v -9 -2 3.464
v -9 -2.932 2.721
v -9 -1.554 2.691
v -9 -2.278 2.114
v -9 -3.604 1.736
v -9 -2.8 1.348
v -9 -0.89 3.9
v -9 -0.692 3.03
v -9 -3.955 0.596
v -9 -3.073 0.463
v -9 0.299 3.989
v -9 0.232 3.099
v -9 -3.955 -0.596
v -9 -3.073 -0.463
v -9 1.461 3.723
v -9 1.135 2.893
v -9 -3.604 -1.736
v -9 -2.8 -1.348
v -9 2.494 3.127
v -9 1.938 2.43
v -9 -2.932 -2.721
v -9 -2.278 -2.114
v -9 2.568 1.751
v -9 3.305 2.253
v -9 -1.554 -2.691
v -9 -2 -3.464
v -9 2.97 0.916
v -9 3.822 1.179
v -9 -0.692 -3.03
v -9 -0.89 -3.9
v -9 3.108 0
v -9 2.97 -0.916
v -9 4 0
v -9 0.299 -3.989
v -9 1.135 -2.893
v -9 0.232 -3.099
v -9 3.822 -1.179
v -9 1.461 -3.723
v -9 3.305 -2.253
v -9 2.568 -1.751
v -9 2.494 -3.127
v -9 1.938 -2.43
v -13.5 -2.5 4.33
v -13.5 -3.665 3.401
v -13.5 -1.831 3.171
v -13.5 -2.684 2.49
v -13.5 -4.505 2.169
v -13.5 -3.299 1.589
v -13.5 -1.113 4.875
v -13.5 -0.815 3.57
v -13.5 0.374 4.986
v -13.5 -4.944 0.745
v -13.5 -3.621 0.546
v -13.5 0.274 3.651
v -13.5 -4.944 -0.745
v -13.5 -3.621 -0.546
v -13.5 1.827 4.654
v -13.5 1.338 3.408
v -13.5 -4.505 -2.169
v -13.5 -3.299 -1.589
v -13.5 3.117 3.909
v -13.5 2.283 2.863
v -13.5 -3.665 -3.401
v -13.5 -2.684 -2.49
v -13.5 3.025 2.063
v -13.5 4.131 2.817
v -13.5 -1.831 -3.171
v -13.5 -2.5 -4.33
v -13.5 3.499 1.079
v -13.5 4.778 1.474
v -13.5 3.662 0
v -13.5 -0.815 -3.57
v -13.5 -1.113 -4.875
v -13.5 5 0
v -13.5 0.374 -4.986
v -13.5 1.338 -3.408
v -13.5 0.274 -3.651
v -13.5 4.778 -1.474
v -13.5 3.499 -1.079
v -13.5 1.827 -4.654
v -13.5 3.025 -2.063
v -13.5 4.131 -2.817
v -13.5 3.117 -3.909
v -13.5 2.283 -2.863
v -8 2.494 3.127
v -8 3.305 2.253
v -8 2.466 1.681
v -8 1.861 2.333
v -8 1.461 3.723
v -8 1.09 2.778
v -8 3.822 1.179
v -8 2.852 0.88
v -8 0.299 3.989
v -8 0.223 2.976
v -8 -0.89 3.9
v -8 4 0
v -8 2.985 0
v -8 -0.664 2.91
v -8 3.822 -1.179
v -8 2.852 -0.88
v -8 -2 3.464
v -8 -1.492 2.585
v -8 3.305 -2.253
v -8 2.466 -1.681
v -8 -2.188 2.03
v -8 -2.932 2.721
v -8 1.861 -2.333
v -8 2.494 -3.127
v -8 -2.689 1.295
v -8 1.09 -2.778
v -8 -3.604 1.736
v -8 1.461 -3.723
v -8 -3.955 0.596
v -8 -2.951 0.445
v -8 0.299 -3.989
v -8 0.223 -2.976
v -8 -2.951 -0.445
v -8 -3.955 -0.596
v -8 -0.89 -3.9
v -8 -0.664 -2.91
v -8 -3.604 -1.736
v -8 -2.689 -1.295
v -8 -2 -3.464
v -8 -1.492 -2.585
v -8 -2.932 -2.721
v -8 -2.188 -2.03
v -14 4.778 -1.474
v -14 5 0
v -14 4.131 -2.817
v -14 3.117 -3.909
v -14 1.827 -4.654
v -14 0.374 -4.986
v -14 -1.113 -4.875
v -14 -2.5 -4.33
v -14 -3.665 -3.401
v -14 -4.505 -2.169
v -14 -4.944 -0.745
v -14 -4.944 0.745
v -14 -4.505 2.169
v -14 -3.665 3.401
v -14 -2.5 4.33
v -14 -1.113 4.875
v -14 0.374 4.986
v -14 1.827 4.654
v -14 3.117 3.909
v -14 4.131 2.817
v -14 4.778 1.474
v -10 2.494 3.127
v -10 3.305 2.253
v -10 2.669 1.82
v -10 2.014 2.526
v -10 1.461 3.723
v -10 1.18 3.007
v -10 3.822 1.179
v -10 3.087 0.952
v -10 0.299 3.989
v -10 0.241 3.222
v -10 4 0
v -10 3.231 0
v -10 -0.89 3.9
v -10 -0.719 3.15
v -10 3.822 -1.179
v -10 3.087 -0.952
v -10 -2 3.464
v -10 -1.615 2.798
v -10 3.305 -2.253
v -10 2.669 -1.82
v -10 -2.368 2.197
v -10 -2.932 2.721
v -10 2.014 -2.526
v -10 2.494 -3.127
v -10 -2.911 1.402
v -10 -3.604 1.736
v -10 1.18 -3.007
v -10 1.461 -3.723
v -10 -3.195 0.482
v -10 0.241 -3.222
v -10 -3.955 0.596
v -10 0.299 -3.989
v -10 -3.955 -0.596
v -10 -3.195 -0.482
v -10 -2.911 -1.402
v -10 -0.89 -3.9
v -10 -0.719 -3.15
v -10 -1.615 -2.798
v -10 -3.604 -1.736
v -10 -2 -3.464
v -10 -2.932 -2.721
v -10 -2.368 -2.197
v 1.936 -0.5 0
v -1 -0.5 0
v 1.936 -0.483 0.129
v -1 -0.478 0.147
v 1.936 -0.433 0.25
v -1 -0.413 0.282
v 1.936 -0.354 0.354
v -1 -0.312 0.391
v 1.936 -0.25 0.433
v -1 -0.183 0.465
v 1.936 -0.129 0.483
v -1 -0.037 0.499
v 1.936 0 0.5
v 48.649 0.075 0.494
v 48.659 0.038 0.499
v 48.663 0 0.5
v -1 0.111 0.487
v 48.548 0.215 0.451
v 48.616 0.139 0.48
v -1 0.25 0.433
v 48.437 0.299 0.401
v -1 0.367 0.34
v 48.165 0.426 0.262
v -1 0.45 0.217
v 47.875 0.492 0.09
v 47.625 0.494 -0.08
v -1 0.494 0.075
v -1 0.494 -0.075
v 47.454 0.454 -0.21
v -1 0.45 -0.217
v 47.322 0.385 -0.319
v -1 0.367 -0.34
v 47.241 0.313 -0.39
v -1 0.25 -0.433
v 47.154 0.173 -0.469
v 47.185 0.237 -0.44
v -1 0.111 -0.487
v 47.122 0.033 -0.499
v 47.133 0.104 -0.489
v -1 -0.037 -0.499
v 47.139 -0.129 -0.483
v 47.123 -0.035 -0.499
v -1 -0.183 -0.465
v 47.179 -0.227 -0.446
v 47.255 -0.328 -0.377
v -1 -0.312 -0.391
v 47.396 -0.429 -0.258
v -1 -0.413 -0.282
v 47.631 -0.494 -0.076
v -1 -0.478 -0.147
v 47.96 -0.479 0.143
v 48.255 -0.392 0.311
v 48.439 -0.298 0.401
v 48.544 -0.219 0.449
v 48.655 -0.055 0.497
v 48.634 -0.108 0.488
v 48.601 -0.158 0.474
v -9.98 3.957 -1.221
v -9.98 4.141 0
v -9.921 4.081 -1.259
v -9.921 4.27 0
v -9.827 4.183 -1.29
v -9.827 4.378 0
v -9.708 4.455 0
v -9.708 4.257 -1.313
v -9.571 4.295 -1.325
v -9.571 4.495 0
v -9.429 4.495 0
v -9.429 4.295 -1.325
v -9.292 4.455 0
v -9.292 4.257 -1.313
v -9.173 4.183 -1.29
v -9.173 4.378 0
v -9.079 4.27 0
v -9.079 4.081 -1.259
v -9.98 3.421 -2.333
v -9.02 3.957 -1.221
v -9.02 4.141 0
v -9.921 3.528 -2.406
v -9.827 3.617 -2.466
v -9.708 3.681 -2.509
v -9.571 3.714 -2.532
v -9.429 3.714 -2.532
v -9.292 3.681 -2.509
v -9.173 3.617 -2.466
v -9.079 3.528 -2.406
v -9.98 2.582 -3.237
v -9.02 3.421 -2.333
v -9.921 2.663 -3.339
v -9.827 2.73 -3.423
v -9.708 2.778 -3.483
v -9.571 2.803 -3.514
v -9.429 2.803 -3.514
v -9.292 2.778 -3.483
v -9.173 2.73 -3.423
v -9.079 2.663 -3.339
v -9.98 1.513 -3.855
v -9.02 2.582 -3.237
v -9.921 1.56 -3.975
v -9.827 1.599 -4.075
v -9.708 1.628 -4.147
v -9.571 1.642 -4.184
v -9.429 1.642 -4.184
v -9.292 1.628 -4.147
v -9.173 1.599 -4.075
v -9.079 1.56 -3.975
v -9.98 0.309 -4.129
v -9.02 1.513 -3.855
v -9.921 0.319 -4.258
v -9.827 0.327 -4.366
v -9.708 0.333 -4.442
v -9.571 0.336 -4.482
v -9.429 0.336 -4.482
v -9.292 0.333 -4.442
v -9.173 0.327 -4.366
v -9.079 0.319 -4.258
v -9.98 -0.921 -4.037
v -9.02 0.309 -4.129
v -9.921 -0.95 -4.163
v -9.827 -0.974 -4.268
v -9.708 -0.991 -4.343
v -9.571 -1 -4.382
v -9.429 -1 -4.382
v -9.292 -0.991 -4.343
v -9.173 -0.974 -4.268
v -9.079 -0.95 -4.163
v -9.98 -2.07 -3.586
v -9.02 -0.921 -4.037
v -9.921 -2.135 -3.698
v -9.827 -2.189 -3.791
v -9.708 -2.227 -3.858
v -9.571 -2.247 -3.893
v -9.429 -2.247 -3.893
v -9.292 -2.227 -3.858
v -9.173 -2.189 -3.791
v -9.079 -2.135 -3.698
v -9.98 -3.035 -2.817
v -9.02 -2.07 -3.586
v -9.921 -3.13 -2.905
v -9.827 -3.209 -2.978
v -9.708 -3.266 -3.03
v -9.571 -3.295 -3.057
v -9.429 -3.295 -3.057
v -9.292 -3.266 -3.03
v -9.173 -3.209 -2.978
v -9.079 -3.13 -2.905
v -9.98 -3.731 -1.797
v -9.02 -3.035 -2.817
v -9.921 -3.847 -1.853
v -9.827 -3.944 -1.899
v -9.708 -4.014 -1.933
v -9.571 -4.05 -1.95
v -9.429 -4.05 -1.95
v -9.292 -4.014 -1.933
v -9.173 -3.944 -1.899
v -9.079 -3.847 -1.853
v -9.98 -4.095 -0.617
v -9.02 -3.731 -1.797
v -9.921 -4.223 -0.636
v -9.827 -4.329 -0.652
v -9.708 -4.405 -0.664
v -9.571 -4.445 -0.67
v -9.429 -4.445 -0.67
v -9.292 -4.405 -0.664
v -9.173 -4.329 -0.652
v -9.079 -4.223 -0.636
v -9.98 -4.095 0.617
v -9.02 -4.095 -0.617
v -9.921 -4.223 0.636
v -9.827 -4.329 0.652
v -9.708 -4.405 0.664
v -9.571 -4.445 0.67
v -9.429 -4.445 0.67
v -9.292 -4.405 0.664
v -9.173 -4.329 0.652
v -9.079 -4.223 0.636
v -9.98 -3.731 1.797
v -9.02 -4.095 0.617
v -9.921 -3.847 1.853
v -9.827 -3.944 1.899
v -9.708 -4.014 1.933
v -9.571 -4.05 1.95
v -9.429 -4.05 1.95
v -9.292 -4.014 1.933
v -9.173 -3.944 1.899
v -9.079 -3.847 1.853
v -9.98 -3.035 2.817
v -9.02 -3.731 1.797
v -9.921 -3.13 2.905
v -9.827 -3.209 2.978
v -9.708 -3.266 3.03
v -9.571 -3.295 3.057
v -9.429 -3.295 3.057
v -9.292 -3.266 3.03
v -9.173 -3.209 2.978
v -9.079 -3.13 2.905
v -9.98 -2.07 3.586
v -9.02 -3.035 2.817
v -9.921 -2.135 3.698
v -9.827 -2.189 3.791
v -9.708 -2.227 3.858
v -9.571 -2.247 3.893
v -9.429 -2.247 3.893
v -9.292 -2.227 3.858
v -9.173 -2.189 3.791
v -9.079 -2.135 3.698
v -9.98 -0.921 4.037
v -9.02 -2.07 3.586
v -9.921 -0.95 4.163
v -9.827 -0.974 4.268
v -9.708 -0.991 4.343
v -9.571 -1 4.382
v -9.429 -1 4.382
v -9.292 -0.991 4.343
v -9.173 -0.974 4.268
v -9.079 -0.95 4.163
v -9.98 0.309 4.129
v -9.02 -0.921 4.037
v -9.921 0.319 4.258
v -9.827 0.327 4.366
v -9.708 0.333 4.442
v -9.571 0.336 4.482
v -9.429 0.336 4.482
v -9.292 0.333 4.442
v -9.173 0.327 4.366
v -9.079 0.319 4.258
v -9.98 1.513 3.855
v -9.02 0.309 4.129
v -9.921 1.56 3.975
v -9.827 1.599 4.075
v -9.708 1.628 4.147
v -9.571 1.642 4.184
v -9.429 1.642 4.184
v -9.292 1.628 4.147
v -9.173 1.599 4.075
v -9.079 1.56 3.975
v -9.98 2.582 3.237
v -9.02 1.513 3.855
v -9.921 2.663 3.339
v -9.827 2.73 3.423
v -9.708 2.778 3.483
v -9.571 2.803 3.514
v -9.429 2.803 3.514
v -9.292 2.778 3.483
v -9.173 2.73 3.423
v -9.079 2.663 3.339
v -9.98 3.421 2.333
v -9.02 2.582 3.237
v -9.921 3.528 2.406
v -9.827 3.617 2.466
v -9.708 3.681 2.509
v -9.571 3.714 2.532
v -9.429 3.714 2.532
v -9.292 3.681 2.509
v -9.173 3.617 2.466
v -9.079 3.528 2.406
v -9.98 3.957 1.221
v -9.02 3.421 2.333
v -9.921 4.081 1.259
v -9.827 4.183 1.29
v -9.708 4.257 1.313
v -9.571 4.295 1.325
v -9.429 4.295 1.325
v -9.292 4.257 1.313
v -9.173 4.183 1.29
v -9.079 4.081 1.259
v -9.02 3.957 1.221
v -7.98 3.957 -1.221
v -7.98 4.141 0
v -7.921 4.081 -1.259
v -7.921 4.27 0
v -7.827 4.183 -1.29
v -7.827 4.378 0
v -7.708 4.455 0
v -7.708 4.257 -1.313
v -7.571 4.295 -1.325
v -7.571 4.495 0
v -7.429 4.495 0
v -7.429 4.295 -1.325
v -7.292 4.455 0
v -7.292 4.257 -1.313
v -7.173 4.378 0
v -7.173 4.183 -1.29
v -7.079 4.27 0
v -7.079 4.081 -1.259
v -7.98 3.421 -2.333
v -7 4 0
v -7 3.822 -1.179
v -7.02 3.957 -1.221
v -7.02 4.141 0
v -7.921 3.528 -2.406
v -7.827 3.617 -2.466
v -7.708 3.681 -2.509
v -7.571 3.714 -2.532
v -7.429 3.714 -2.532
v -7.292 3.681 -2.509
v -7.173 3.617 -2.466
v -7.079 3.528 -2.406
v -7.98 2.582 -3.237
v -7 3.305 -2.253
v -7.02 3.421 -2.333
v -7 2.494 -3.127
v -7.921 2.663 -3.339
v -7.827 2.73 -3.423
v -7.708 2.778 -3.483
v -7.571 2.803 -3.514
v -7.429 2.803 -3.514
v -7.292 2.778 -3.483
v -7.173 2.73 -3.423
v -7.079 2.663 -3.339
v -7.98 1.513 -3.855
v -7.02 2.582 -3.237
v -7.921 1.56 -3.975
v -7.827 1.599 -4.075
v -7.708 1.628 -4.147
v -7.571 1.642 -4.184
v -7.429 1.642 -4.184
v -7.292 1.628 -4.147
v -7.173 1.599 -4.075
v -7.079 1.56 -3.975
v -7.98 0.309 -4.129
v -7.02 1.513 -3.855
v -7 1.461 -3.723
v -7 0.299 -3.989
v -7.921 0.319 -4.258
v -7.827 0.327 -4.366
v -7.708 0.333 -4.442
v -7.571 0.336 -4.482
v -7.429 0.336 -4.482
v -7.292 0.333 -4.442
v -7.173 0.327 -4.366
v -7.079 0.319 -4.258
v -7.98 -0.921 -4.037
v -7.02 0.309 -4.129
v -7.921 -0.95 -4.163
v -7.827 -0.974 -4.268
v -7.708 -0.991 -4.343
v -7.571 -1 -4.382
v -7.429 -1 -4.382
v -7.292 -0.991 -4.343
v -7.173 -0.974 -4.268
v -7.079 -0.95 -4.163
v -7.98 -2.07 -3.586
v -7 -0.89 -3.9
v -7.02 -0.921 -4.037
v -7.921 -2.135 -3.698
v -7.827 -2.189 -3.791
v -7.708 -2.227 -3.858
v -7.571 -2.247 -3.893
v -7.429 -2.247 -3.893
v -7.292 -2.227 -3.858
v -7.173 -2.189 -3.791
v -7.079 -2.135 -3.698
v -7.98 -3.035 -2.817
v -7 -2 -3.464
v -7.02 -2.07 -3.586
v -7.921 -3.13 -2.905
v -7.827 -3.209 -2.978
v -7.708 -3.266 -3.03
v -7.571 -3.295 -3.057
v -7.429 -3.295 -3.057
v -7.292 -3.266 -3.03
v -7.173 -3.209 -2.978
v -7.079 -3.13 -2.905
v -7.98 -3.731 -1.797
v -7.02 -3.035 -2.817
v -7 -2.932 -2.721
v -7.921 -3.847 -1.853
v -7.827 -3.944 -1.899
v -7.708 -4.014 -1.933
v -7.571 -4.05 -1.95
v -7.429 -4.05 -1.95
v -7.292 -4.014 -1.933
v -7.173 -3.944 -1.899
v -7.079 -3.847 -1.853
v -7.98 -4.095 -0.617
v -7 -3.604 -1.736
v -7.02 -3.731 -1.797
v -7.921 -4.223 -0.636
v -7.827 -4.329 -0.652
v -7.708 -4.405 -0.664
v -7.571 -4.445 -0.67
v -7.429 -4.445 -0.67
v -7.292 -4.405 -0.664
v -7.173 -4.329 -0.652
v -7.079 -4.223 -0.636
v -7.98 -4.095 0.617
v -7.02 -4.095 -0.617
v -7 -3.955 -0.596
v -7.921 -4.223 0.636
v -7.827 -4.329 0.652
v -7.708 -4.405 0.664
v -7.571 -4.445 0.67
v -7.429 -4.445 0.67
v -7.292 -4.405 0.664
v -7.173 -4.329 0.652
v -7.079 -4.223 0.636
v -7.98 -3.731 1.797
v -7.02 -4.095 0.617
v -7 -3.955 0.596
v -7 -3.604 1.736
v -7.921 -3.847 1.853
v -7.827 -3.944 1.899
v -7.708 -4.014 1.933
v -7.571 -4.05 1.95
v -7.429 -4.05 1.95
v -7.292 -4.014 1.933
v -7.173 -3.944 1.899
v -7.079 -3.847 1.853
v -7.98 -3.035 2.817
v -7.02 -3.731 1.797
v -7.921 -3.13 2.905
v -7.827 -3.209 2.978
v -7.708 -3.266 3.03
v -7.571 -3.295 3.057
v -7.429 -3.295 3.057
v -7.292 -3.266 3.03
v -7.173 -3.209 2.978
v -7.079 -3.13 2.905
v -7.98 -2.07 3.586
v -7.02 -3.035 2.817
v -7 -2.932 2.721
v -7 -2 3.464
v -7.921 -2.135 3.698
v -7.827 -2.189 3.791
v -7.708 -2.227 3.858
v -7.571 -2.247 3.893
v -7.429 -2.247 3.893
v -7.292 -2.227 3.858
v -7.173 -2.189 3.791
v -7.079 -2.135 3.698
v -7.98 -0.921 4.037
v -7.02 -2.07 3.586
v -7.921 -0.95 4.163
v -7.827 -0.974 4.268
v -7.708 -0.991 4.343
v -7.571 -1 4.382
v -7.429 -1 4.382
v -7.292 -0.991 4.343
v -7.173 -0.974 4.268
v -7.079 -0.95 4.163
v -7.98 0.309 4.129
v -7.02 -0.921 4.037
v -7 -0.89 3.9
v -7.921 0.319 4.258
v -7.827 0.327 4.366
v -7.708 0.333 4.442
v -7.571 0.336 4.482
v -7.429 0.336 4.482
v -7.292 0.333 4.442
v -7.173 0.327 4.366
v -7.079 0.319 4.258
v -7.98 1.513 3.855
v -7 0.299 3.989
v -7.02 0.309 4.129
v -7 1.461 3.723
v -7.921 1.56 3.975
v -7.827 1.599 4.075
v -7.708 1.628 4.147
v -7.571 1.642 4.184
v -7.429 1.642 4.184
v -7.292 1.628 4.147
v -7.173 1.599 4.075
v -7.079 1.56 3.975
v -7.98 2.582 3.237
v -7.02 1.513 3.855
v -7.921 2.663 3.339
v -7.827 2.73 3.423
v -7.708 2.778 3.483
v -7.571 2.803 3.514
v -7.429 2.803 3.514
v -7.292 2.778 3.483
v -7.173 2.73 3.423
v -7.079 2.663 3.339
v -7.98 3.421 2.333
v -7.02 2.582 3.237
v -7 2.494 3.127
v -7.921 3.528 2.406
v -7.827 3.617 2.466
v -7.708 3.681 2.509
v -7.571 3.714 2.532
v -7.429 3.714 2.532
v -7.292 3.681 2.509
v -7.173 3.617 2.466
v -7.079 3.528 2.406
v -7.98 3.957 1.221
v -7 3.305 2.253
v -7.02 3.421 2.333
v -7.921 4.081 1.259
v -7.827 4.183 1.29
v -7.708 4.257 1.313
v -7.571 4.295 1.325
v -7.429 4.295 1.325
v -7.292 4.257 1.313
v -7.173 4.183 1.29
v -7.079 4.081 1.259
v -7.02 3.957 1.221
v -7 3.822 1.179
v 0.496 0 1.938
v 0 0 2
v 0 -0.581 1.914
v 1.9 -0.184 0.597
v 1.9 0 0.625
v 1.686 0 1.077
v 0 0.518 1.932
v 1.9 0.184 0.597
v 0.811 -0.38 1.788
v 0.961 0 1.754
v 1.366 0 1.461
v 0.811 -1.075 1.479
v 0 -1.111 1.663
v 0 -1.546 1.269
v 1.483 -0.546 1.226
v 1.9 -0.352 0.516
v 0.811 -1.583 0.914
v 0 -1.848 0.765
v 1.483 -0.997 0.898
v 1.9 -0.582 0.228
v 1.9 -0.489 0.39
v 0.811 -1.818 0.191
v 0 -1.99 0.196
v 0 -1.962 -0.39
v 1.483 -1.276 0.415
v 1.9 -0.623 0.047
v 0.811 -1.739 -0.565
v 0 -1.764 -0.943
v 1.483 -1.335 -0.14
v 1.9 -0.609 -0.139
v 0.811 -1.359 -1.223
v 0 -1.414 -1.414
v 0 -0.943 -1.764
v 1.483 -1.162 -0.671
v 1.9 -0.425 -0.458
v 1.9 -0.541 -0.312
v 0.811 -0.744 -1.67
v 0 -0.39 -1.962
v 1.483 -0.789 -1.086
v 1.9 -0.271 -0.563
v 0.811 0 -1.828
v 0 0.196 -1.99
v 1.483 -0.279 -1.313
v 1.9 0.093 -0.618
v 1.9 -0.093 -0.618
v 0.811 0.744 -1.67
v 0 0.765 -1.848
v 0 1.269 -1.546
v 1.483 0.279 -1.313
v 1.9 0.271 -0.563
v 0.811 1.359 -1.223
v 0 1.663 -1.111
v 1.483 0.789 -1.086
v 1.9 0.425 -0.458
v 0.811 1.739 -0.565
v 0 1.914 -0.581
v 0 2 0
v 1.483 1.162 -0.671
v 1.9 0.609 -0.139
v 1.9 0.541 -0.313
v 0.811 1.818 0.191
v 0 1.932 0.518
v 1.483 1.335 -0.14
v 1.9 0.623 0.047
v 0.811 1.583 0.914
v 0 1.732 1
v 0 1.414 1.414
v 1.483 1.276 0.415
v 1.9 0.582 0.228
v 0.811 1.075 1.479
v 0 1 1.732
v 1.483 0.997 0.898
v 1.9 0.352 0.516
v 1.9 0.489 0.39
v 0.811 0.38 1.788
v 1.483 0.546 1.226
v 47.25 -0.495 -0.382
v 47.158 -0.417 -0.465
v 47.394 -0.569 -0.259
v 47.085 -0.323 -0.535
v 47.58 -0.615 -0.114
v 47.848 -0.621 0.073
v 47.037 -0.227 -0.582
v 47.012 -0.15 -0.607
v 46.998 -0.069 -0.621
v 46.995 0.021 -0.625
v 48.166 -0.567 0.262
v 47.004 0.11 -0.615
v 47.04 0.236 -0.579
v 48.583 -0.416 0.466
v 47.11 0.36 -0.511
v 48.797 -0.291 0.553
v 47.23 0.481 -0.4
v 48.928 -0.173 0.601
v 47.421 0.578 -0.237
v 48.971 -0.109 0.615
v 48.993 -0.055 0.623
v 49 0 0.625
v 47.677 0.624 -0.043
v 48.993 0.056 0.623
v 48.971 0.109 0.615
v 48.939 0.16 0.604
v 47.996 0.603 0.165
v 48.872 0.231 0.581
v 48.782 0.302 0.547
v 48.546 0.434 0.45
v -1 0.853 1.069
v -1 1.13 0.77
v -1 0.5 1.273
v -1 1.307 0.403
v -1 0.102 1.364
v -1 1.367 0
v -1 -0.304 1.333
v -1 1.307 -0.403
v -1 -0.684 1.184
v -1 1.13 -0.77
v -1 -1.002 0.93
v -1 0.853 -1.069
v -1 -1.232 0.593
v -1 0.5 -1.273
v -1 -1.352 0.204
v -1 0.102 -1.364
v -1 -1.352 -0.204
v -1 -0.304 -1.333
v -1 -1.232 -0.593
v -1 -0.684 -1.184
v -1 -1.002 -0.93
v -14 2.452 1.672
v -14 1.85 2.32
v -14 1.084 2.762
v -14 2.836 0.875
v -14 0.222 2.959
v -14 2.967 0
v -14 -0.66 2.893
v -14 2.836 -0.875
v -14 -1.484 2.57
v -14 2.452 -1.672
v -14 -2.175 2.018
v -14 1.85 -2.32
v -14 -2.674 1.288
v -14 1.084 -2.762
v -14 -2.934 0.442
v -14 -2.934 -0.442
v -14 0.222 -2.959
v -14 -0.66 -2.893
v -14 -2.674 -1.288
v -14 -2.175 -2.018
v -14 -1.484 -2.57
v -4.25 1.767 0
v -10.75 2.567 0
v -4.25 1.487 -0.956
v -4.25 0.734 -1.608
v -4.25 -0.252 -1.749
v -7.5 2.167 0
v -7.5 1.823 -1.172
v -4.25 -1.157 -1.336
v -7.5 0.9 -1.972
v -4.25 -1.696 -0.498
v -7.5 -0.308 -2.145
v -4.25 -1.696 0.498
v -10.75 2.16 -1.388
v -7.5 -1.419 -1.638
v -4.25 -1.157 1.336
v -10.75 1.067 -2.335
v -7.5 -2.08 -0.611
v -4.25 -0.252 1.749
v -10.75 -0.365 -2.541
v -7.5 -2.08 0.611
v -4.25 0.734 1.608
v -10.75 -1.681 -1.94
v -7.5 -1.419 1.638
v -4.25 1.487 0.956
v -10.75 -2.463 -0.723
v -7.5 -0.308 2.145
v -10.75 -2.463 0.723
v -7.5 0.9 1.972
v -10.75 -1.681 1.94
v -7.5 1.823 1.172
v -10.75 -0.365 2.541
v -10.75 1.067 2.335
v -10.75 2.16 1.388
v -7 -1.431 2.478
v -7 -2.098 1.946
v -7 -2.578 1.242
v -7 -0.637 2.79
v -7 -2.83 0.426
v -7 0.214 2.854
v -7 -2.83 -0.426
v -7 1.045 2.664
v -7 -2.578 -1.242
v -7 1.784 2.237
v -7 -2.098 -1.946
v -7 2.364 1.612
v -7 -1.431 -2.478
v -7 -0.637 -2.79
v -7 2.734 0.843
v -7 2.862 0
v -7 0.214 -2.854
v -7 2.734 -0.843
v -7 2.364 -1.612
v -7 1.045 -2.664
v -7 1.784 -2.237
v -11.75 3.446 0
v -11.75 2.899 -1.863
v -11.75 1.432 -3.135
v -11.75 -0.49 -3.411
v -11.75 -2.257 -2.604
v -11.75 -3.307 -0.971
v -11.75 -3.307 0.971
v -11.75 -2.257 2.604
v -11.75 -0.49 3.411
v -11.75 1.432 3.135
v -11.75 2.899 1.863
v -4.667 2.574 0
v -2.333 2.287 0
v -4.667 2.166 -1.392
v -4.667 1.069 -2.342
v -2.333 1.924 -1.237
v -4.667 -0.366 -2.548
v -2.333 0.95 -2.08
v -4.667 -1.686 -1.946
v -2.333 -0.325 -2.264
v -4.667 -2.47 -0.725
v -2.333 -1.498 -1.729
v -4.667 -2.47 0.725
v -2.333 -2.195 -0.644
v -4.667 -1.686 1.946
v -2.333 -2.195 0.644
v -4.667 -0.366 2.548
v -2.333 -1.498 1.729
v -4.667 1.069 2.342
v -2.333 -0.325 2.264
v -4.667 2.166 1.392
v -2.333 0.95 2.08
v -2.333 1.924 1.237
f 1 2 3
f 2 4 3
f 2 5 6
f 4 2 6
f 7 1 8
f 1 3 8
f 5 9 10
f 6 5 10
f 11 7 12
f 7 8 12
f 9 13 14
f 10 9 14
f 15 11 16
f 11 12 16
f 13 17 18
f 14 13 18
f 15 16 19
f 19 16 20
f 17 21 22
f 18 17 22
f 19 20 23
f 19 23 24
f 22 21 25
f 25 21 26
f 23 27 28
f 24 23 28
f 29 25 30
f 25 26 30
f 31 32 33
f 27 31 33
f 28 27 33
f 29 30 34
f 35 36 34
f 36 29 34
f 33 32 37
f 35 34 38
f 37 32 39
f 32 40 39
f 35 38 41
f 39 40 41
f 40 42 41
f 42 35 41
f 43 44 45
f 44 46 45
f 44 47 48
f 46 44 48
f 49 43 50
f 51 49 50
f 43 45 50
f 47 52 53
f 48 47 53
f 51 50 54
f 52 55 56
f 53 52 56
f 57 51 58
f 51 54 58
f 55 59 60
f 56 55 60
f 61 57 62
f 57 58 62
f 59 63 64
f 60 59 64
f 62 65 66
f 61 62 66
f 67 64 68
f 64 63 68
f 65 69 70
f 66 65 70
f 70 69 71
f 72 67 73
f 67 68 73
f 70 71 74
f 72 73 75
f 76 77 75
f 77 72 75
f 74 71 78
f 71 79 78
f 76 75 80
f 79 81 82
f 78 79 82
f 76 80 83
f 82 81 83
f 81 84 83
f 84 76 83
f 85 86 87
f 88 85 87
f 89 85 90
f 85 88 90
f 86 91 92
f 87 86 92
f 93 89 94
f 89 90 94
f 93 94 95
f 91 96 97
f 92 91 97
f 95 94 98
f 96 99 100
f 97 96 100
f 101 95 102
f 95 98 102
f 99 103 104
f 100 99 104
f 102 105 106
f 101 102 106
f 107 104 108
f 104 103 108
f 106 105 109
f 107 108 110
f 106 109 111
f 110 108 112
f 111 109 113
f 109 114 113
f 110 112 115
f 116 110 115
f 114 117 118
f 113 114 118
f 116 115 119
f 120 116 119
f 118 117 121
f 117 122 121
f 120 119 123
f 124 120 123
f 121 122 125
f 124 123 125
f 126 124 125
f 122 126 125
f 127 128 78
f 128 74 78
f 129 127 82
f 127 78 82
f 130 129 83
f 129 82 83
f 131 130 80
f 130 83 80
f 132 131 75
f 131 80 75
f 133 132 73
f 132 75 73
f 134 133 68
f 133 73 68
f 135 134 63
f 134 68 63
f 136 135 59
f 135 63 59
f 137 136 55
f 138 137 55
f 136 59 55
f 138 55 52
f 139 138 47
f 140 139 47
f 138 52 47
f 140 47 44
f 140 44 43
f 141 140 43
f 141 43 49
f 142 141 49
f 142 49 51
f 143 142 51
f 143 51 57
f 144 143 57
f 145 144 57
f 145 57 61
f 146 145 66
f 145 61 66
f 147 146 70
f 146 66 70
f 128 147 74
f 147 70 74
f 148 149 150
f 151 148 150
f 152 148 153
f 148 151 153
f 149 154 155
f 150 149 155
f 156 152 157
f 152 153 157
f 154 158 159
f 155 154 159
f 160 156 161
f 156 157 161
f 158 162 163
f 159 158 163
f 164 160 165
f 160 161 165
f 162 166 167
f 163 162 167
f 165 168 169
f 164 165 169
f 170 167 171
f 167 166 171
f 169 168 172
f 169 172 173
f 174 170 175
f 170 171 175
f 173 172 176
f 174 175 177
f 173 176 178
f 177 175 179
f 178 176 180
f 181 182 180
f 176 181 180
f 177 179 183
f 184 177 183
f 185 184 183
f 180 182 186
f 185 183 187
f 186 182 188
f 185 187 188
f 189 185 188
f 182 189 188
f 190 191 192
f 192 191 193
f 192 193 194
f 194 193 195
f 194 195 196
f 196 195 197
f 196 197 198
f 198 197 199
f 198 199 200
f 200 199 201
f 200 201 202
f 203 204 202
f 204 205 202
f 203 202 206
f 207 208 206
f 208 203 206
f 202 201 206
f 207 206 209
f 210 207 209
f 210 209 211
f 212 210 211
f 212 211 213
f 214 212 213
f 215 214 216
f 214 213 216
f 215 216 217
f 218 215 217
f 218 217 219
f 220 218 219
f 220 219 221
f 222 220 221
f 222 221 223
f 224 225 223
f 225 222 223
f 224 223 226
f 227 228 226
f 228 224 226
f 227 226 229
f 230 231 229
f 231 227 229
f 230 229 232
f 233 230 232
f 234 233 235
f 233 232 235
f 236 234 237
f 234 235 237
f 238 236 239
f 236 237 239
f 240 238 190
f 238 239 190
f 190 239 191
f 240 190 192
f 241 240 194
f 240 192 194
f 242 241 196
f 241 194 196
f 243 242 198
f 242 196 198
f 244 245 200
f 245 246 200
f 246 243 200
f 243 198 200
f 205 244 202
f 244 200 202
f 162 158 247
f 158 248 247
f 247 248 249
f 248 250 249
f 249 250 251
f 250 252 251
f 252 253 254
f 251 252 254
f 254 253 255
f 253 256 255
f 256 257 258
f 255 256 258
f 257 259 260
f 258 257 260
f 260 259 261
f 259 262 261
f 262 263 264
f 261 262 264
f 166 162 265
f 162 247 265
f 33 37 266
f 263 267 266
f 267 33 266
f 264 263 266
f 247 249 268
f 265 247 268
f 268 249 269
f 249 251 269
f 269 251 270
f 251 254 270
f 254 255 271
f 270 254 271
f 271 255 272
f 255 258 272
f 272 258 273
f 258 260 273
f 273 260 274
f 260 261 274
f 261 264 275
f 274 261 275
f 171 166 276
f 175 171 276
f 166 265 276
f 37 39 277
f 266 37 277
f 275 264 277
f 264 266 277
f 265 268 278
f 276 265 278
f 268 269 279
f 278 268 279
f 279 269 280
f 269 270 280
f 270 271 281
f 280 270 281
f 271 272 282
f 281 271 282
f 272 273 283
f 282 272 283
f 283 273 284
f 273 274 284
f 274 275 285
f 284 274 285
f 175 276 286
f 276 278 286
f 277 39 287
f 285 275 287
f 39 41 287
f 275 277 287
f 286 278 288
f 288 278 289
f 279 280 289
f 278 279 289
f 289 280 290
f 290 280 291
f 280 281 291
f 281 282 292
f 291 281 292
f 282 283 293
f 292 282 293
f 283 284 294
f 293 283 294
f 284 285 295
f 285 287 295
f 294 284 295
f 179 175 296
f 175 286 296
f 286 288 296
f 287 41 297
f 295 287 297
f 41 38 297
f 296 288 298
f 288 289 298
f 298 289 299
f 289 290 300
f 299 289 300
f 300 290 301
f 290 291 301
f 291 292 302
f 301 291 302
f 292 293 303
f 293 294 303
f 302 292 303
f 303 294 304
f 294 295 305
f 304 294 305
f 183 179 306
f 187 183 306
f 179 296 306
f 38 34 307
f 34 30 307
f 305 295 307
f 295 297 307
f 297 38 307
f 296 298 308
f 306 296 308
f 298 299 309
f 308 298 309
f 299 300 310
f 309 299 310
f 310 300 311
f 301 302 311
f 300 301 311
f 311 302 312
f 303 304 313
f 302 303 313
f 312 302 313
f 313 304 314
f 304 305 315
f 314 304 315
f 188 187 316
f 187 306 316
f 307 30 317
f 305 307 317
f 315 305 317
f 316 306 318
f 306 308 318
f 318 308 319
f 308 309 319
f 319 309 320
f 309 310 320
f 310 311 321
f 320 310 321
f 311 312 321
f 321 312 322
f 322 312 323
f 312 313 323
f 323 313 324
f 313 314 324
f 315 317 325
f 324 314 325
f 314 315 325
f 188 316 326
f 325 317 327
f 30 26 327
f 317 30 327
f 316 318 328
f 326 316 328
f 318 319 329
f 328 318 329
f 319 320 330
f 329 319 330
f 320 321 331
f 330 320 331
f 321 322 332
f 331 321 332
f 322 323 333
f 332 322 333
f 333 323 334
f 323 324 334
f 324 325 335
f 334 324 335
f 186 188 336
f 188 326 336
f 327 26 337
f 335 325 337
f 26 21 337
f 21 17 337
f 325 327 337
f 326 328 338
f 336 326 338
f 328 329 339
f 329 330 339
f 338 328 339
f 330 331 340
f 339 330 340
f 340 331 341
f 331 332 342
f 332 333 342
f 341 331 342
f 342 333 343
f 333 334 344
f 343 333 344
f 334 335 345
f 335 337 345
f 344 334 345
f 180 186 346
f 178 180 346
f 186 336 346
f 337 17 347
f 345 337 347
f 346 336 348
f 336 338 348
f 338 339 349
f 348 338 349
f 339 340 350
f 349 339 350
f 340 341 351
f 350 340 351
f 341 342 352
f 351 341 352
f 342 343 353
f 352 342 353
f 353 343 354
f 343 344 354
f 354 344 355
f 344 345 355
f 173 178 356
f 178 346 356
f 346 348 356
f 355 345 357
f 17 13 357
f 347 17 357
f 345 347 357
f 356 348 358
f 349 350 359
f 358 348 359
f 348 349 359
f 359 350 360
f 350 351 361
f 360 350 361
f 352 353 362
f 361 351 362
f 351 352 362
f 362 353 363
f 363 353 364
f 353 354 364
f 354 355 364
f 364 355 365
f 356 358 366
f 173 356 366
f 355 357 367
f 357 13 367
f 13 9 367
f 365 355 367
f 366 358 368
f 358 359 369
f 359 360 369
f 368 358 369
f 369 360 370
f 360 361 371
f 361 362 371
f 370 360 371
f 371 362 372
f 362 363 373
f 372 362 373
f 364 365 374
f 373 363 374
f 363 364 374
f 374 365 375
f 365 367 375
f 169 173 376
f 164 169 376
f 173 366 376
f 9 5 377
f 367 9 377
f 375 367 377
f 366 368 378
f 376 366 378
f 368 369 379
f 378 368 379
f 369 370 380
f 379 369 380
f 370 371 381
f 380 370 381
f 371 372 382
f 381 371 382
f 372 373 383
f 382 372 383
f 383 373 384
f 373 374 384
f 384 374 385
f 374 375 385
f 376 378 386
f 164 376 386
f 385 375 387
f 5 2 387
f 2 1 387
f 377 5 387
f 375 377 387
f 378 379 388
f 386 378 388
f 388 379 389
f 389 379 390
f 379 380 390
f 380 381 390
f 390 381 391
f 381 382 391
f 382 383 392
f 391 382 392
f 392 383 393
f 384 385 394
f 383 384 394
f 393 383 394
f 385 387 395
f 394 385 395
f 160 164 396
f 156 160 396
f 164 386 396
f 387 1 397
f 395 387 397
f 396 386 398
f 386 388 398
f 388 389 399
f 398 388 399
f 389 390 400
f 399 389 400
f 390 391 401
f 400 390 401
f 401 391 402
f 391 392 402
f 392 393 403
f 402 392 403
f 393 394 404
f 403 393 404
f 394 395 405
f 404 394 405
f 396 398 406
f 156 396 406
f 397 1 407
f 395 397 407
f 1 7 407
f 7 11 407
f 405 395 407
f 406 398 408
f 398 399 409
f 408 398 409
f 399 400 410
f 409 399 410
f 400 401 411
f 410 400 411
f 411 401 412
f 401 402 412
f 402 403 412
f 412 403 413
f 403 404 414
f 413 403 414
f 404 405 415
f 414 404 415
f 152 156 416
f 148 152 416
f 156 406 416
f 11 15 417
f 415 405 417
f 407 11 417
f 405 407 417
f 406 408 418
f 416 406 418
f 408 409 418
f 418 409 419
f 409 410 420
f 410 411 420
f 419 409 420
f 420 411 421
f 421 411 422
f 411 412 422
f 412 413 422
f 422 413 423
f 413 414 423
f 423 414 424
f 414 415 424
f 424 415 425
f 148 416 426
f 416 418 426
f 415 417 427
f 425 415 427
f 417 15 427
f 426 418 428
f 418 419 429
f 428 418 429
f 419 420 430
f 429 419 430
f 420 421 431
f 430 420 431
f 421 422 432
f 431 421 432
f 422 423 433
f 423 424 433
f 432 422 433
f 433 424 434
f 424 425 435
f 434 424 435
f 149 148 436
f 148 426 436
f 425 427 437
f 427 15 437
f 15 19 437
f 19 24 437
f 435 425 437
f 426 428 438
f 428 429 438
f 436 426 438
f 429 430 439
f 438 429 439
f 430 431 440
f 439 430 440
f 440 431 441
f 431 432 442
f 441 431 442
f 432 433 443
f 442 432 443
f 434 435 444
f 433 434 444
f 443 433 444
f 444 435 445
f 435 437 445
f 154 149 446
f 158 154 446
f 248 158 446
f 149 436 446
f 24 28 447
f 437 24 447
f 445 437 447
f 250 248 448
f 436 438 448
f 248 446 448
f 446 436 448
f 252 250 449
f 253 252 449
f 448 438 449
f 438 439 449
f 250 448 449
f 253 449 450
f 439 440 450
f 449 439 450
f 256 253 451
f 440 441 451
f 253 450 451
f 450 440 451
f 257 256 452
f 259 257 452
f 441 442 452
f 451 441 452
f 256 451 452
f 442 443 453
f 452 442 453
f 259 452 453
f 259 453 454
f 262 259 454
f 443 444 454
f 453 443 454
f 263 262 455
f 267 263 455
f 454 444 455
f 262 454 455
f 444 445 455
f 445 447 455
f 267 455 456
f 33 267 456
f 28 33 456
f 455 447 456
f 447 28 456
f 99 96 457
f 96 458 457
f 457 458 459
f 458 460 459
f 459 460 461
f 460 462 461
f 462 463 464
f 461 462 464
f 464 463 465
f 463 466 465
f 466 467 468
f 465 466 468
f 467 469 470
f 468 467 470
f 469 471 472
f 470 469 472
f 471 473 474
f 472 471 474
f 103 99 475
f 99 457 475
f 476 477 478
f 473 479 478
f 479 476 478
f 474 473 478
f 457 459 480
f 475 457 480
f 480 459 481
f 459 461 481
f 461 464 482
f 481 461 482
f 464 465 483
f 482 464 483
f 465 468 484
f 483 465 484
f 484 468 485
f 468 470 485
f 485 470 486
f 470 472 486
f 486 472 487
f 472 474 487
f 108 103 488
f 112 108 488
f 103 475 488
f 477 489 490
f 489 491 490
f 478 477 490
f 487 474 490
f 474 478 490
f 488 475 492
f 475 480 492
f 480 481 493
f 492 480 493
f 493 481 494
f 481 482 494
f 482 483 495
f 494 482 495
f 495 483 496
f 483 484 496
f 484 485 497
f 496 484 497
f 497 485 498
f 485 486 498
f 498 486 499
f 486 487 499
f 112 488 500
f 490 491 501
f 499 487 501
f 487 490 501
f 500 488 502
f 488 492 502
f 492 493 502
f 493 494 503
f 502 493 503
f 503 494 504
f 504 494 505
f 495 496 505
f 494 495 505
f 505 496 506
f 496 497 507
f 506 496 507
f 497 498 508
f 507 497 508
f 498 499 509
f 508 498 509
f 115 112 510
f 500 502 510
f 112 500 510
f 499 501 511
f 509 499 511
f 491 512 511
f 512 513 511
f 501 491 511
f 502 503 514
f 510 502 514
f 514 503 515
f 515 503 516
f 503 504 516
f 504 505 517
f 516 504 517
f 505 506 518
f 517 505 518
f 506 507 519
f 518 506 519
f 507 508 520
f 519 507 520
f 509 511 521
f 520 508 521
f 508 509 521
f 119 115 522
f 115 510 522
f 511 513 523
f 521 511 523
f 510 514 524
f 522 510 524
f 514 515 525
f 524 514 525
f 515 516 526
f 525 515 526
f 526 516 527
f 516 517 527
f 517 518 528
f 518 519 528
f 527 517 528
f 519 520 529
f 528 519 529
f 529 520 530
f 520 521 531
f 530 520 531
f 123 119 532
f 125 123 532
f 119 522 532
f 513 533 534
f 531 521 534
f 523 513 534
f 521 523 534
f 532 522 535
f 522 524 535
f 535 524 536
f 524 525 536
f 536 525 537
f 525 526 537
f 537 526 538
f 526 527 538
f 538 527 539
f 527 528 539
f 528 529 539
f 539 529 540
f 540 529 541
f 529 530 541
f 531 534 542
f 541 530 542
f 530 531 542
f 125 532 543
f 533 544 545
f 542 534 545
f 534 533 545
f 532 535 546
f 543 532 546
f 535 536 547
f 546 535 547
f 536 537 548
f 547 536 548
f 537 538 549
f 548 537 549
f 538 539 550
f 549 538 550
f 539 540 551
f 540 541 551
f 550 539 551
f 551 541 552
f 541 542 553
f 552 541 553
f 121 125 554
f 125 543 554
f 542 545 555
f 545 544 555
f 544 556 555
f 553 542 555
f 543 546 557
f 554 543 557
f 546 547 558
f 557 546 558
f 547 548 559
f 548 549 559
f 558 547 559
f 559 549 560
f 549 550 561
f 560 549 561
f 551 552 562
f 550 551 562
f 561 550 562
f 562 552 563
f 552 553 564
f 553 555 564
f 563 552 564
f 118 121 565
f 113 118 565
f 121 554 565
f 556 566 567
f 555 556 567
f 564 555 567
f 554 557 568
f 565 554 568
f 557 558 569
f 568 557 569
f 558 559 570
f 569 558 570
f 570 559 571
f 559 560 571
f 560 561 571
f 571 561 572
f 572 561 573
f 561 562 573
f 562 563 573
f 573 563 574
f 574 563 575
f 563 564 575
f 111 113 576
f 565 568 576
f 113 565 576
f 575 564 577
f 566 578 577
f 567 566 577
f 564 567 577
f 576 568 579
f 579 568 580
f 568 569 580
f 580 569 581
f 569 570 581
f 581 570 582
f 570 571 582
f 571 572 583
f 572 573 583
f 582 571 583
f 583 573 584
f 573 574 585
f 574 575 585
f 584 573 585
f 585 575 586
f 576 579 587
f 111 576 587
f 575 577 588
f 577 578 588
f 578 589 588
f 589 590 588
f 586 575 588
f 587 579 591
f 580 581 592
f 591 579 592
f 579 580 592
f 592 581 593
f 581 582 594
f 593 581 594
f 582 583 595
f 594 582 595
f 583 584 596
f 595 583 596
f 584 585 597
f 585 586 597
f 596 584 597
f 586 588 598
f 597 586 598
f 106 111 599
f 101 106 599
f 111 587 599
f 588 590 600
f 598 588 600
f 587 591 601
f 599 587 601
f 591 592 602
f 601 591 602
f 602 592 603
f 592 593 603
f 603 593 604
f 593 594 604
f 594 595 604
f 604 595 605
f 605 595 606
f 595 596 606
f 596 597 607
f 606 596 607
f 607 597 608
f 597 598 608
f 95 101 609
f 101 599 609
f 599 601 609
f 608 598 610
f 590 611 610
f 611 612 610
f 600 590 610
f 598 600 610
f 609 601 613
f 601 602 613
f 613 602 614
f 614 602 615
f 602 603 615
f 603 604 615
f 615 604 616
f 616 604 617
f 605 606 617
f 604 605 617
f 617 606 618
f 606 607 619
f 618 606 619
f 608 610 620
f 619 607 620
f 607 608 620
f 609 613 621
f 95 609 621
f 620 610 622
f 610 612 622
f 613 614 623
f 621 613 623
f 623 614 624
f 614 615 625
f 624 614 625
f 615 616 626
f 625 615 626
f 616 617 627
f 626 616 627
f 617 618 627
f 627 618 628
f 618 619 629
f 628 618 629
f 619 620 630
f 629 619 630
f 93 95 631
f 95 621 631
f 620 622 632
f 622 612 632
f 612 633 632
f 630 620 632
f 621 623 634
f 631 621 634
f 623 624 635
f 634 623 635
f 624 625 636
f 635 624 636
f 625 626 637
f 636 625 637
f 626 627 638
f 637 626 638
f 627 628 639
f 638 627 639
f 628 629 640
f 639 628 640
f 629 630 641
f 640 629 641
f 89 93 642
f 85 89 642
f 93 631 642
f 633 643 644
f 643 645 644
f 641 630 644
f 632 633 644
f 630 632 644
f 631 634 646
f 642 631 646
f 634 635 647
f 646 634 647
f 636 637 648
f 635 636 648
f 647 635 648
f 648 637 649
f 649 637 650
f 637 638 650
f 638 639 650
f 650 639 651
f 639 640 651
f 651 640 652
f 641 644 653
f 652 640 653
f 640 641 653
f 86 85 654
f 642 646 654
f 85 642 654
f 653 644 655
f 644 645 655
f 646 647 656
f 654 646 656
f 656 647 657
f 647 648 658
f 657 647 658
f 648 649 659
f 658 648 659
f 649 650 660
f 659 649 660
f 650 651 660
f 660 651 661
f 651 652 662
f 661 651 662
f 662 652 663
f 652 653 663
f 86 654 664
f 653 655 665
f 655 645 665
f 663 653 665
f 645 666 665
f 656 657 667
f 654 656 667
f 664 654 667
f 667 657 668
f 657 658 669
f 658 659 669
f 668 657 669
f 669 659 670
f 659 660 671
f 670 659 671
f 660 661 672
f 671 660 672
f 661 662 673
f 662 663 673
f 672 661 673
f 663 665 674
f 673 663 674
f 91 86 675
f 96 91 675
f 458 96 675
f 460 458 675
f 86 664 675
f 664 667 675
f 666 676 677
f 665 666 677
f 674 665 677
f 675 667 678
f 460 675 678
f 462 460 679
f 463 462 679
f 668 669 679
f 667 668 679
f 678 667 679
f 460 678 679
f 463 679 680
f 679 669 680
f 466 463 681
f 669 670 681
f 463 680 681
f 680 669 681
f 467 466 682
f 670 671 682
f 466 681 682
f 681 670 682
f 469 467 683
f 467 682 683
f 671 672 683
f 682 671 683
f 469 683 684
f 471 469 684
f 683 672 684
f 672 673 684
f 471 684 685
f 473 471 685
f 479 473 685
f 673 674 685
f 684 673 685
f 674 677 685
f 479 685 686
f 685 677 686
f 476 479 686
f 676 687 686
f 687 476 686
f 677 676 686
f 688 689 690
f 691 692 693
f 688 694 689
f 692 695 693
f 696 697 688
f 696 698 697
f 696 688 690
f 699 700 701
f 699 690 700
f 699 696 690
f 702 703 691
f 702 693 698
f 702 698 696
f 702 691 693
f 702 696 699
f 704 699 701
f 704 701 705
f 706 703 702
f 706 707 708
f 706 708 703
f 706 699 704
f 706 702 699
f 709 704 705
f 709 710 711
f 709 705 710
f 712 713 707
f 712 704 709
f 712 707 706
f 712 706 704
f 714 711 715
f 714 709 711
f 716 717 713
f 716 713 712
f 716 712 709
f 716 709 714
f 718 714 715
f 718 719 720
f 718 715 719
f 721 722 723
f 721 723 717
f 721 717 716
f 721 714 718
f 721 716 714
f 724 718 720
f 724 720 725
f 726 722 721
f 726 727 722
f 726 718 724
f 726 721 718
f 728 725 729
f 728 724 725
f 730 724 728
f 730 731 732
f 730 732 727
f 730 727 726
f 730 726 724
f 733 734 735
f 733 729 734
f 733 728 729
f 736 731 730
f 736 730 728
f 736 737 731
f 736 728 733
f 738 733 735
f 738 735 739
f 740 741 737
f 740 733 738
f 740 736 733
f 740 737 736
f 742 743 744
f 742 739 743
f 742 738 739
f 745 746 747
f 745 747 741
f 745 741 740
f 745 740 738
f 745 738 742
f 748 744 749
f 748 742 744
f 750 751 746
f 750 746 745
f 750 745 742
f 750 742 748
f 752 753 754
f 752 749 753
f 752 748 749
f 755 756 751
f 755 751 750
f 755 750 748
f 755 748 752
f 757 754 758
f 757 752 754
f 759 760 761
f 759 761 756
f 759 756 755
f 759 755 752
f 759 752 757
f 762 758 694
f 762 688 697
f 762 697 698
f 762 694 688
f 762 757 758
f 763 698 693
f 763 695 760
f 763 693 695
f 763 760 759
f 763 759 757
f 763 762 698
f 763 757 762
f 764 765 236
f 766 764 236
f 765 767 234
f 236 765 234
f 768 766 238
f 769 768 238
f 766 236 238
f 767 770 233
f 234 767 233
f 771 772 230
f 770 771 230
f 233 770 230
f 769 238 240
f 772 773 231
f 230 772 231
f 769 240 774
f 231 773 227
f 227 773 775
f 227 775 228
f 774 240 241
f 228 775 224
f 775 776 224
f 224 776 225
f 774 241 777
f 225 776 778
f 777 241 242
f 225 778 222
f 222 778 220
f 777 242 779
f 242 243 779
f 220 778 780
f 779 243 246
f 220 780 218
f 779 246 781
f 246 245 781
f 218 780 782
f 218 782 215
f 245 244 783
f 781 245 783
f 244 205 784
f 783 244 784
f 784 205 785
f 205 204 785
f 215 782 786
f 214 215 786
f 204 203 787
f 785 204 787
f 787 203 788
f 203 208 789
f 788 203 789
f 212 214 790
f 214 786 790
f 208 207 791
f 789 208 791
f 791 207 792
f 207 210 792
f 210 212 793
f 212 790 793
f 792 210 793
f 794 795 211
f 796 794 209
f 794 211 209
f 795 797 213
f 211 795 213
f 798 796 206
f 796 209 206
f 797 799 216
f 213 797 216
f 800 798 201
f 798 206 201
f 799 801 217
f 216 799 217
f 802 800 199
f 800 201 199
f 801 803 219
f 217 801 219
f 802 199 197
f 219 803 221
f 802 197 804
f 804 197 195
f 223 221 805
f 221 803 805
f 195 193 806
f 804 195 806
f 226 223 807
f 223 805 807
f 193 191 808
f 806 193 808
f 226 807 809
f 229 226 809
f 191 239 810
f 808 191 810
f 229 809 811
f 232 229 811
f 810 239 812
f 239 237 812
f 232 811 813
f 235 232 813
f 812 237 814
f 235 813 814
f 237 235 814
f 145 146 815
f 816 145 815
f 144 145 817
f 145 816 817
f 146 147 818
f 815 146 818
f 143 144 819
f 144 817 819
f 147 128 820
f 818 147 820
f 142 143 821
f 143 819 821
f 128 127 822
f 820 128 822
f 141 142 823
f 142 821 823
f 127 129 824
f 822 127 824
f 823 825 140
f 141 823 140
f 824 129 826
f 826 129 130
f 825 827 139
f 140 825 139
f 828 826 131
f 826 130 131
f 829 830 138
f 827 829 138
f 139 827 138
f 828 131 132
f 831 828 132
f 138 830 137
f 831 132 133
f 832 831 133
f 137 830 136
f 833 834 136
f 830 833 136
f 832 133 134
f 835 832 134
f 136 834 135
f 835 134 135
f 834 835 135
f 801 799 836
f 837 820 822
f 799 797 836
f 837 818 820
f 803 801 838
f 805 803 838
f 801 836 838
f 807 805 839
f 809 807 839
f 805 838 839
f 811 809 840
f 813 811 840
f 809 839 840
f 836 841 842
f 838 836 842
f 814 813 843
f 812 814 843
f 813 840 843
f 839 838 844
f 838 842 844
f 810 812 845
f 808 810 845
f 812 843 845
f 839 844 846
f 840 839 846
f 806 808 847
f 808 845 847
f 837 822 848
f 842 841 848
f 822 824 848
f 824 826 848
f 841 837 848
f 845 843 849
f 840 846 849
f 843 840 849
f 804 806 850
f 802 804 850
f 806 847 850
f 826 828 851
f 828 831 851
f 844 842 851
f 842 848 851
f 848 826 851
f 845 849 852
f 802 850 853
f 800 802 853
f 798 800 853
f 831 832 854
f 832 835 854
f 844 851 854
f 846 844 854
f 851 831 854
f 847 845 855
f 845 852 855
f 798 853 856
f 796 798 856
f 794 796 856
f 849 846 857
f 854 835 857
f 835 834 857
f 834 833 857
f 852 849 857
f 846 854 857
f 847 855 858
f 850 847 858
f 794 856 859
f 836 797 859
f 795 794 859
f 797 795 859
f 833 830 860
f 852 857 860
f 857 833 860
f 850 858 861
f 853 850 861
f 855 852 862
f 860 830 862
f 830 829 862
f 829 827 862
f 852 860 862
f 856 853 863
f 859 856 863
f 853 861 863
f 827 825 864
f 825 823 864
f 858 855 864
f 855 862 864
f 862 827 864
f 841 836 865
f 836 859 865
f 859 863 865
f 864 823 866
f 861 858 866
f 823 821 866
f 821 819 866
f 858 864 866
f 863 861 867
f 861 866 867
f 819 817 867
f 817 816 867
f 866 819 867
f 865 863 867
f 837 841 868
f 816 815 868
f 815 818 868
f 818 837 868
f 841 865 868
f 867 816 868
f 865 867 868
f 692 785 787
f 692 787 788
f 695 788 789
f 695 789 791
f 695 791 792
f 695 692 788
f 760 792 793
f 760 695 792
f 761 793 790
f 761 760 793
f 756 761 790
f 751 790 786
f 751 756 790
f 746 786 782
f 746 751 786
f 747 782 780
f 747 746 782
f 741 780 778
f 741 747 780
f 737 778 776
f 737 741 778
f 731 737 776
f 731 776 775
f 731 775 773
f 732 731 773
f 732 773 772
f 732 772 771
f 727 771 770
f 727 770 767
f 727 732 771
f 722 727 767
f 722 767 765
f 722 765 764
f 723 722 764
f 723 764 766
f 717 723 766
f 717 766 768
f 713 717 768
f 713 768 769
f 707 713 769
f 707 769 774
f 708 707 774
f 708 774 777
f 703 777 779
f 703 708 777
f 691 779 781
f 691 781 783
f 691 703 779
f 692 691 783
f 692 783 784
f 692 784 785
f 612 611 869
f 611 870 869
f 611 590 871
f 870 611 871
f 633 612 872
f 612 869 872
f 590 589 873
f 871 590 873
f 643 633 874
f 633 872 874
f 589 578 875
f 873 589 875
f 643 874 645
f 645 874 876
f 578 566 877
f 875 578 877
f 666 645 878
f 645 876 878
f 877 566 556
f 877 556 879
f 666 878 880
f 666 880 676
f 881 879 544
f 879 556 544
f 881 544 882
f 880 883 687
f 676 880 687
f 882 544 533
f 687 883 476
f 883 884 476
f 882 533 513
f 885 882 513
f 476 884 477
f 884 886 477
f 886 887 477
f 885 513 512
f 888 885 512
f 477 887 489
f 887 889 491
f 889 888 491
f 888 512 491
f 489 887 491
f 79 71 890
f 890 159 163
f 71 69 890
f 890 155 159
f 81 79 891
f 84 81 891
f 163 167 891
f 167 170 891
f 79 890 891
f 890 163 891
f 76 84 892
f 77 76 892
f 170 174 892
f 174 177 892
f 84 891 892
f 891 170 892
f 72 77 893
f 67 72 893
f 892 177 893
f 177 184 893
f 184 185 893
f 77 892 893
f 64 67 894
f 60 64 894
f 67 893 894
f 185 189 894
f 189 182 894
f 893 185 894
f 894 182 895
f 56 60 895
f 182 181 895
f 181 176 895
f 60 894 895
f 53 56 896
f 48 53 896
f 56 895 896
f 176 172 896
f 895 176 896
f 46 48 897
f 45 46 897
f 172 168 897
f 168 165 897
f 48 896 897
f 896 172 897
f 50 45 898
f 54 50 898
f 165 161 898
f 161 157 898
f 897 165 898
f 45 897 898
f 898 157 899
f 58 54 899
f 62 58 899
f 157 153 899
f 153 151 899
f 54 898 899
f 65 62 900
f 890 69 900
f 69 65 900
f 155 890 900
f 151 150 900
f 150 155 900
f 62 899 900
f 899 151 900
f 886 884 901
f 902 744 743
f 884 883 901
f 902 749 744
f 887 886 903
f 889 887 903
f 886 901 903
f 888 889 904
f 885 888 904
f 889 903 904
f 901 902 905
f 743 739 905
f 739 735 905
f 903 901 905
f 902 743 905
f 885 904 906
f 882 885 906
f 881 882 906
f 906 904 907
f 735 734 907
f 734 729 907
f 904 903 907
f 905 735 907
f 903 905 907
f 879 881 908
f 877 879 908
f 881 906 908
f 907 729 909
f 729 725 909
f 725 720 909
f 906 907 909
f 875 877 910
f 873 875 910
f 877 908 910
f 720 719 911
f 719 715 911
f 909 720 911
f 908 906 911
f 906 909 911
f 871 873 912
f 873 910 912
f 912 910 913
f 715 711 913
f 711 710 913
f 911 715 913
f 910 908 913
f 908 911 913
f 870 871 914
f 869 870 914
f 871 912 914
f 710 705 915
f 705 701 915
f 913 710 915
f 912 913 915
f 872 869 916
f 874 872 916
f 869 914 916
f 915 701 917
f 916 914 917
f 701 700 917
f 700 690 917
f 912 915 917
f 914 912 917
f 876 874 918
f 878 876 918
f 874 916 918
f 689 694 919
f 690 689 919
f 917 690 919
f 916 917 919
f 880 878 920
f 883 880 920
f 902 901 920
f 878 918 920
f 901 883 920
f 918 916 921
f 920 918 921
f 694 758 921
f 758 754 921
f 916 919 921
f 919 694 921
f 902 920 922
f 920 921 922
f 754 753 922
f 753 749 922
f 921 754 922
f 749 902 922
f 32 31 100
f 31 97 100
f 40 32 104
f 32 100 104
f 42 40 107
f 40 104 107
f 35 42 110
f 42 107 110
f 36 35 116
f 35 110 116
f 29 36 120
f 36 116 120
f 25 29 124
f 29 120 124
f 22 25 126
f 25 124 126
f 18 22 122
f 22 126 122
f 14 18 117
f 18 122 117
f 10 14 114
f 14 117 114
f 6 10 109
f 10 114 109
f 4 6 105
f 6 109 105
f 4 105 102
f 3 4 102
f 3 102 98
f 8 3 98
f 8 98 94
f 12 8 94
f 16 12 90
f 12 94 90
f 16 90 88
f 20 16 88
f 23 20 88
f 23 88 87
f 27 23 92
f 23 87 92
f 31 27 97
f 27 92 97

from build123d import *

# Parameters (mm, degrees)
D_ME1_FACE_RADIUS       = 2
D_ME1_HEIGHT            = 2
ESQUISSE2_R             = 0.5
ENL_V_MAT_EXTRU_1_DEPTH = 10
ESQUISSE3_R             = 0.625
ESQUISSE3_R_2           = 0.5
EXTRU_MINCE1_DEPTH      = 50
ESQUISSE4_R             = 3.5
ENL_V_MAT_EXTRU_2_DEPTH = 25
ESQUISSE5_R             = 5
ENL_V_MAT_EXTRU_3_DEPTH = 25


with BuildPart() as part:
    # Esquisse1 → Révolution1 (revolve)
    with BuildSketch(Plane.XY):
        with BuildLine():
            Line((0, 0), (-1, 0))
            Line((-1, 0), (-1, 1.3674178))
            Line((-1, 1.3674178), (-14, 2.9674178))
            Line((-14, 2.9674178), (-14, 5))
            Line((-14, 5), (-13.5, 5))
            Line((-13.5, 5), (-13.5, 3.661538462))
            Line((-13.5, 3.661538462), (-10, 3.230769231))
            Line((-10, 3.230769231), (-10, 4))
            ThreePointArc((-10, 4), (-9.5, 4.5), (-9, 4))
            Line((-9, 4), (-9, 3.107692308))
            Line((-9, 3.107692308), (-8, 2.984615385))
            Line((-8, 2.984615385), (-8, 4))
            ThreePointArc((-8, 4), (-7.5, 4.5), (-7, 4))
            Line((-7, 4), (-7, 2.861538462))
            Line((-7, 2.861538462), (0, 2))
            Line((0, 2), (0, 0))
        make_face()
    revolve(axis=Axis((18.517191928, 0, 0), (-1, 0, 0)))

    # Dôme1: a dome of height H over a round flat face of radius A is a cap of a sphere of radius (A * A + H * H) / (2 * H)
    d_me1_r = (D_ME1_FACE_RADIUS * D_ME1_FACE_RADIUS + D_ME1_HEIGHT * D_ME1_HEIGHT) / (2 * D_ME1_HEIGHT)
    d_me1_base = Plane((0, 0, 0), z_dir=(1, 0, 0))
    with Locations(d_me1_base.offset(D_ME1_HEIGHT - d_me1_r)):
        d_me1_ball = Sphere(d_me1_r, mode=Mode.PRIVATE)
    add(split(d_me1_ball, bisect_by=d_me1_base, keep=Keep.TOP, mode=Mode.PRIVATE))

    # Esquisse2 → Enlèv. mat.-Extru.1 (cut)
    with BuildSketch(Plane.ZY.offset(1)):
        with Locations(Location((0, 0, 0), (0, 0, 270))):
            Circle(ESQUISSE2_R)
    extrude(amount=-ENL_V_MAT_EXTRU_1_DEPTH, mode=Mode.SUBTRACT)

    # Esquisse3 → Extru.-Mince1 (add)
    with BuildSketch(Plane.ZY.offset(1)):
        Circle(ESQUISSE3_R)
        Circle(ESQUISSE3_R_2, mode=Mode.SUBTRACT)
    extrude(amount=-EXTRU_MINCE1_DEPTH)

    # Esquisse4 → Enlèv. mat.-Extru.2 (cut, symmetric)
    with BuildSketch(Plane(origin=(0, 0, 0), x_dir=(1, 0, 0), z_dir=(0, 1, 0))):
        with Locations((49, 3.5)):
            Circle(ESQUISSE4_R)
    extrude(amount=ENL_V_MAT_EXTRU_2_DEPTH, both=True, mode=Mode.SUBTRACT)

    # Esquisse5 → Enlèv. mat.-Extru.3 (cut, symmetric)
    with BuildSketch(Plane(origin=(0, 0, 0), x_dir=(1, 0, 0), z_dir=(0, 1, 0))):
        with Locations((50.566966107, 4.123117229)):
            Circle(ESQUISSE5_R)
    extrude(amount=ENL_V_MAT_EXTRU_3_DEPTH, both=True, mode=Mode.SUBTRACT)


solid = part.part
